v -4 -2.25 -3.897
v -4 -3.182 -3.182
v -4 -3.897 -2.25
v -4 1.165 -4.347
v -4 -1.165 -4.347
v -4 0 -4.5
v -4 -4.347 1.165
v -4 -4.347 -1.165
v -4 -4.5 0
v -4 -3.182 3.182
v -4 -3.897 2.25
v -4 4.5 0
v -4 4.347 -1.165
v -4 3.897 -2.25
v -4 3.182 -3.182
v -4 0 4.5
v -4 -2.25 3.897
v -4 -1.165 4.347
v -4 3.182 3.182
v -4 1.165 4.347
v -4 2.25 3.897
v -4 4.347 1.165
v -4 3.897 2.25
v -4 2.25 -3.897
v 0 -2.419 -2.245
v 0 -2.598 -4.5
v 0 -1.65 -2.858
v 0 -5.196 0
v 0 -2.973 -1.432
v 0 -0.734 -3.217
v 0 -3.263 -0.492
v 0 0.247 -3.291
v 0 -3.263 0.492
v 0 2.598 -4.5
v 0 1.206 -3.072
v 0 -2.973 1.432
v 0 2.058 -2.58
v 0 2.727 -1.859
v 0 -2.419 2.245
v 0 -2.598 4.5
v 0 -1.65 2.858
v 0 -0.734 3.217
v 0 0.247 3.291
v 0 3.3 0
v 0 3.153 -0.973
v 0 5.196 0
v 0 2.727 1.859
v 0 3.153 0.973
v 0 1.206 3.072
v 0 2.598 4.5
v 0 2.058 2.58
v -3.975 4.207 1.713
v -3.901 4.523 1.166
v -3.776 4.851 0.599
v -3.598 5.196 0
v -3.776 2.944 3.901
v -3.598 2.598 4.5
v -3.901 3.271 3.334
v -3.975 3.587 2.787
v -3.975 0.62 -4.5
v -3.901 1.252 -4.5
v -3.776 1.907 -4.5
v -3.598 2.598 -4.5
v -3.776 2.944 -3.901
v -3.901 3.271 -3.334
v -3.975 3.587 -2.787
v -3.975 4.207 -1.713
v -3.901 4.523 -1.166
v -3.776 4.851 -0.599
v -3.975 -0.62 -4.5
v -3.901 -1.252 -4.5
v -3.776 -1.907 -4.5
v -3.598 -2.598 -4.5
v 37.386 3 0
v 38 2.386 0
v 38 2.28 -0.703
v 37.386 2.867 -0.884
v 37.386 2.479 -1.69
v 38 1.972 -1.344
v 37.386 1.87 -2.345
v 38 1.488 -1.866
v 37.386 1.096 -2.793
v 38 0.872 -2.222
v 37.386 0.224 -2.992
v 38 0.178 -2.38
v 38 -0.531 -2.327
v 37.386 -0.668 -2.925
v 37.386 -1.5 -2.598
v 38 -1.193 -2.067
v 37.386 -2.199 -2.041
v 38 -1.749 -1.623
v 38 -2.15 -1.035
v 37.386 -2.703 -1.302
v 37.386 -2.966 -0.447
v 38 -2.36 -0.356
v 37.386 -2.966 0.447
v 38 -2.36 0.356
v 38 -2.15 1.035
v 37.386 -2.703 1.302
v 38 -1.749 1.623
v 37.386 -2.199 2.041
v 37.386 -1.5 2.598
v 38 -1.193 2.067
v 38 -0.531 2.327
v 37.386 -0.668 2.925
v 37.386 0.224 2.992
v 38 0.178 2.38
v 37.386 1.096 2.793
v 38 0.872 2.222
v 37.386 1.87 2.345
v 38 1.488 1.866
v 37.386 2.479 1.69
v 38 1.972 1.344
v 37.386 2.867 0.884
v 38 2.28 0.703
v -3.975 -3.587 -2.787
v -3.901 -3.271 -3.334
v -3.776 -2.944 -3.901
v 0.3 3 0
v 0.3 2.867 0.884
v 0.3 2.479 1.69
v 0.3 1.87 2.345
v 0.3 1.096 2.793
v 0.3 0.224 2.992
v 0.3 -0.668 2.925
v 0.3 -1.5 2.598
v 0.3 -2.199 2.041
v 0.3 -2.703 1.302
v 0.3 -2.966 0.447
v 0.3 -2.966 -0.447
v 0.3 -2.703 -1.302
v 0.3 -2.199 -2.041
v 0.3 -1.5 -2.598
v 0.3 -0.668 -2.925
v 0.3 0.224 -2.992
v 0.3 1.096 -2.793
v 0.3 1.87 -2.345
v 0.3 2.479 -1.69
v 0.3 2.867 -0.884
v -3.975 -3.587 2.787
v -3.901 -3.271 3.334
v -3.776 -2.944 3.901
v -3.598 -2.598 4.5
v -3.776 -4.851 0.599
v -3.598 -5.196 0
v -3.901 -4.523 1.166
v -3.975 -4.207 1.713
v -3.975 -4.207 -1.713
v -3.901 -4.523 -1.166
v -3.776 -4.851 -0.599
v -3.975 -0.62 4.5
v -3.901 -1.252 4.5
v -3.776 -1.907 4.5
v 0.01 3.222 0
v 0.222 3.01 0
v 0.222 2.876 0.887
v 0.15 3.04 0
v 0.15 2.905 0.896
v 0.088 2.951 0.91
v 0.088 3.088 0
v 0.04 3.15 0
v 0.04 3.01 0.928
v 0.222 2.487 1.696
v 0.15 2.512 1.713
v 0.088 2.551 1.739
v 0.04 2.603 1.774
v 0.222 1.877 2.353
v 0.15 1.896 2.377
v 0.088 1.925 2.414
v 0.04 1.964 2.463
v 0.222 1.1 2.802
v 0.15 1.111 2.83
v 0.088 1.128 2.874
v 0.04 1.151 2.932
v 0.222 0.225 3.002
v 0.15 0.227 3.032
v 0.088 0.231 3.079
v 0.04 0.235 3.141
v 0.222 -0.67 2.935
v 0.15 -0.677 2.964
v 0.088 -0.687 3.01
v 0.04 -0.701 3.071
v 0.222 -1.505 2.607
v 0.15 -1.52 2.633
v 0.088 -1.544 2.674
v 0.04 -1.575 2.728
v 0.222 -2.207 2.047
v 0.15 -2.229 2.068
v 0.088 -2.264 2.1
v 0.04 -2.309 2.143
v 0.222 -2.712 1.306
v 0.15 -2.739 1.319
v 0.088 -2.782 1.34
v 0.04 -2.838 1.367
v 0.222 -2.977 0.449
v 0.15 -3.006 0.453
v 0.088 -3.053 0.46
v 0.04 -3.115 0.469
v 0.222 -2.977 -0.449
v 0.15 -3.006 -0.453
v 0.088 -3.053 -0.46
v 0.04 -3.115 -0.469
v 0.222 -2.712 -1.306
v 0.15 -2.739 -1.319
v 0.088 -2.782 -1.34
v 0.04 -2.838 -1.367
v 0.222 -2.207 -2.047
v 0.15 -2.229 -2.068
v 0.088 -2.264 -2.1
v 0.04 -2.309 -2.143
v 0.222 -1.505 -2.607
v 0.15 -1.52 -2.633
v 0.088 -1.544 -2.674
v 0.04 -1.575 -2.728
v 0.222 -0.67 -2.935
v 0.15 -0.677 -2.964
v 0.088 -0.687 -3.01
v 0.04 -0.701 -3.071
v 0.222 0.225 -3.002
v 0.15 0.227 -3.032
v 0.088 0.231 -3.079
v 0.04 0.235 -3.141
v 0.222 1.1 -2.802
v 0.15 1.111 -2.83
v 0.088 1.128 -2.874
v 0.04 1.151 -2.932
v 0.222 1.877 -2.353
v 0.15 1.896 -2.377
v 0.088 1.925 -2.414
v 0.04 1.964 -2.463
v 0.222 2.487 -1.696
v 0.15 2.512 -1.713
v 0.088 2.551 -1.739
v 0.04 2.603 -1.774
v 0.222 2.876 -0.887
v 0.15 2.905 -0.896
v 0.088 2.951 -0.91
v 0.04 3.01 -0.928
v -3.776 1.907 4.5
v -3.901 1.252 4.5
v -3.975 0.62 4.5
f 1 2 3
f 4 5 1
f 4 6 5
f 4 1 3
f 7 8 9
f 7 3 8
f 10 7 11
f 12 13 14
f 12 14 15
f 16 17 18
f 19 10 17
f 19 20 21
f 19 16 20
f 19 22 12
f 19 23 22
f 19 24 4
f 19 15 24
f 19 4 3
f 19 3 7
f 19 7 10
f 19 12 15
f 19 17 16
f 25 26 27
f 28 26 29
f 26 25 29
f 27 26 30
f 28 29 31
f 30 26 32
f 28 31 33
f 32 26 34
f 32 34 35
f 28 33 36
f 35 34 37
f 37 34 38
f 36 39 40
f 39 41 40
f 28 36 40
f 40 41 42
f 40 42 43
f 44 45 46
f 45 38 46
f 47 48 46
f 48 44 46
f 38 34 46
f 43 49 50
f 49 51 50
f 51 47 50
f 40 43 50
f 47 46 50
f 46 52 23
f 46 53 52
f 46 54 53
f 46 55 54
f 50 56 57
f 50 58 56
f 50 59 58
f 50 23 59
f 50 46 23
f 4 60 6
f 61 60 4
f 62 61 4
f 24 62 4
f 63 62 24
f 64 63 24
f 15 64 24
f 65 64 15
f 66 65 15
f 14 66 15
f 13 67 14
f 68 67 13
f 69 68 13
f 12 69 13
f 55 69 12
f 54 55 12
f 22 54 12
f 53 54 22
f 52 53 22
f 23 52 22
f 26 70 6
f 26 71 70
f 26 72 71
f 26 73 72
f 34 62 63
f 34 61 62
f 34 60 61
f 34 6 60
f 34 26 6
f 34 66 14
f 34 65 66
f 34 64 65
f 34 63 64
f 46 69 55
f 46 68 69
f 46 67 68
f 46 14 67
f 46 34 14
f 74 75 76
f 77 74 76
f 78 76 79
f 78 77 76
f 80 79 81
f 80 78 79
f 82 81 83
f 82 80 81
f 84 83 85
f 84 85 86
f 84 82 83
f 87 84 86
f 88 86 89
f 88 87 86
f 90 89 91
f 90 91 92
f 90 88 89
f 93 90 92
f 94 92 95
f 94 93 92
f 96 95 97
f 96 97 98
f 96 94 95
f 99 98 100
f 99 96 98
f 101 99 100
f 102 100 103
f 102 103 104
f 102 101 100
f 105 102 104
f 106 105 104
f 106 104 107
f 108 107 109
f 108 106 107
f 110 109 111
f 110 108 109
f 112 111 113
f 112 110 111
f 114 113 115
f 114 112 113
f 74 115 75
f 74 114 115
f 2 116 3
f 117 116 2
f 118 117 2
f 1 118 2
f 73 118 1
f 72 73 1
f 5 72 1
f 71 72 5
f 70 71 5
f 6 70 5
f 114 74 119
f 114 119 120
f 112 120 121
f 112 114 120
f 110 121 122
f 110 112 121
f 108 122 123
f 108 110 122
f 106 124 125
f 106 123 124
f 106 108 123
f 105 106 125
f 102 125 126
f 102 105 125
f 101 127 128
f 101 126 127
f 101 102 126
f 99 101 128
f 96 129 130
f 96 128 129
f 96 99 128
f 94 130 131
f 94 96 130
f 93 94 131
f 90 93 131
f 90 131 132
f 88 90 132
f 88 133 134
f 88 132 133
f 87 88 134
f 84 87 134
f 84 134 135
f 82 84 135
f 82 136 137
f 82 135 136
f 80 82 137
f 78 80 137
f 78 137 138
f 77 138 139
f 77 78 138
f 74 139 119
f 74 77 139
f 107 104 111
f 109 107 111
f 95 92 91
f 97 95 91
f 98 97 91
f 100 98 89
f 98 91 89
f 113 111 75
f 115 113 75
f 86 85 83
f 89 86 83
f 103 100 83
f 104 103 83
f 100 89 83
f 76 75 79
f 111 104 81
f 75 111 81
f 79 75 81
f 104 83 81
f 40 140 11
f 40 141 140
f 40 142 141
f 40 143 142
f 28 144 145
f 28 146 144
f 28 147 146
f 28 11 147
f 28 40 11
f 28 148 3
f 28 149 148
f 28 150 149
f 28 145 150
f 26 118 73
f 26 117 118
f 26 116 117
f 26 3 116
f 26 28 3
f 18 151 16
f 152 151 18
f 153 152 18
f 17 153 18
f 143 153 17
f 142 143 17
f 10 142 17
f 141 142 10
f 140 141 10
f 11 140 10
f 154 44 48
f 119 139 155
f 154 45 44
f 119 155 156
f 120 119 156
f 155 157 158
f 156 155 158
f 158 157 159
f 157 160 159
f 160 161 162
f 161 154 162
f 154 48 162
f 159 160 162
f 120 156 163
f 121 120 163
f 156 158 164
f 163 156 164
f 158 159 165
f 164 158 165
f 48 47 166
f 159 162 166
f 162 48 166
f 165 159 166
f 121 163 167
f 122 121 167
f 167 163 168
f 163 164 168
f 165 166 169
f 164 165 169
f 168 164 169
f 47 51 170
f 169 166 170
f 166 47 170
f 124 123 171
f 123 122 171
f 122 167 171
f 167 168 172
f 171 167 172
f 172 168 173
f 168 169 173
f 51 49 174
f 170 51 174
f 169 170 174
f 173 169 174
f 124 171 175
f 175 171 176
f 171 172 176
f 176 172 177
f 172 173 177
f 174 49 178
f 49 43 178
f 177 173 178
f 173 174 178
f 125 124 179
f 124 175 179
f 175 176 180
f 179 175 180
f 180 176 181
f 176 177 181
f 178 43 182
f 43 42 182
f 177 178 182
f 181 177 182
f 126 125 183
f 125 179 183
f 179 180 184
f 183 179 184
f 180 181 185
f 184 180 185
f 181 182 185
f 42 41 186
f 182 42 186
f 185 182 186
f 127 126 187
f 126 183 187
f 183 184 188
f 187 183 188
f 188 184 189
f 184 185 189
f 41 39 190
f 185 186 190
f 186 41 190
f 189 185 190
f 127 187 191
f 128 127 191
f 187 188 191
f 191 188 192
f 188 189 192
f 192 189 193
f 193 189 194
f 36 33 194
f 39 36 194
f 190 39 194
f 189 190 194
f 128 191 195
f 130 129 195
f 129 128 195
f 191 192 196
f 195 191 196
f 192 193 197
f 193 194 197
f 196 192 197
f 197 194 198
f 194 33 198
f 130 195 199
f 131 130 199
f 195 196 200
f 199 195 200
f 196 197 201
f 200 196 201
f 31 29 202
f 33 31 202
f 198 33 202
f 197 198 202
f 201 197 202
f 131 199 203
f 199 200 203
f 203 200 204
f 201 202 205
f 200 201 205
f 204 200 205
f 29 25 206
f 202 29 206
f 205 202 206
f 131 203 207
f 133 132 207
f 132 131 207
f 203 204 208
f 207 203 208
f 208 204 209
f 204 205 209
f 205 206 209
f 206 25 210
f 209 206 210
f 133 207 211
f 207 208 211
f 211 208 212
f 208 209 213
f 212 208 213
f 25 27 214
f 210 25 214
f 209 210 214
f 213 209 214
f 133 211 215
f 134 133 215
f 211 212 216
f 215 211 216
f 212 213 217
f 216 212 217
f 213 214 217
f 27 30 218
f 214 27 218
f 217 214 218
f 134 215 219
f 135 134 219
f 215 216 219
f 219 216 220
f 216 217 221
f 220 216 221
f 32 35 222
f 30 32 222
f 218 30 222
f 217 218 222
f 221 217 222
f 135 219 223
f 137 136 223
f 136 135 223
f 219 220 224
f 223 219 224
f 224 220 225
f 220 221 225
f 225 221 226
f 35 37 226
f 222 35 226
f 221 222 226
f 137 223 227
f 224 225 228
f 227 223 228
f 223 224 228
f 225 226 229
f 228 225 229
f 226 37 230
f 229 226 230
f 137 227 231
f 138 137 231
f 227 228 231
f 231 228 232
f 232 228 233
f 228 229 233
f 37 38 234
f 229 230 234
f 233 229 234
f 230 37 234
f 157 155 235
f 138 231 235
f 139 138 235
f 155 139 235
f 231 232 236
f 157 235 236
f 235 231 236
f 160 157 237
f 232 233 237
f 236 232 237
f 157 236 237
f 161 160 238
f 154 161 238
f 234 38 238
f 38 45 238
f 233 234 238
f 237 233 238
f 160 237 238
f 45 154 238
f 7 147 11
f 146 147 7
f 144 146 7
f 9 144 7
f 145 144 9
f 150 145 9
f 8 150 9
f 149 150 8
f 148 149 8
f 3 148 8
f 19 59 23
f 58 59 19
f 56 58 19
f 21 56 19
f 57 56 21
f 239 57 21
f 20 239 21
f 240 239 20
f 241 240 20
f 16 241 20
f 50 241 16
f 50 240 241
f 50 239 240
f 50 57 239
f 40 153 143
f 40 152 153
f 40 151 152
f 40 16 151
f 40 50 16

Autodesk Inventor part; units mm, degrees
ref_plane "YZ Plane" through (0, 0, 0) normal (1, 0, 0) x (0, 1, 0)
ref_plane "XZ Plane" through (0, 0, 0) normal (0, 1, 0) x (-1, 0, 0)
sketch "Sketch1" plane through (0, 0, 0) normal (0, 0, 1) x (1, 0, 0)
  line L0 (0, 3) -> (38, 3)
  line L1 (38, 3) -> (38, 0)
  line L2 (38, 0) -> (0, 0)
  line L3 (-7.6, 0) -> (45.6, 0) projected
  line L4 (0, -0.6) -> (0, 3.6) projected
  line L5 (0, 3) -> (0, 0)
  dimension "d2" = 6
  dimension "d59" = 38
revolve "Body" add sketch "Sketch1" angle 360 about axis through (38, 0, 0) along (-1, 0, 0)
sketch "Sketch2" plane through (0, 0, 0) normal (-1, 0, 0) x (0, 0, 1)
  line L0 (0, 5.1962) -> (4.5, 2.5981)
  line L1 (4.5, 2.5981) -> (4.5, -2.5981)
  line L2 (4.5, -2.5981) -> (0, -5.1962)
  line L3 (0, -5.1962) -> (-4.5, -2.5981)
  line L4 (-4.5, -2.5981) -> (-4.5, 2.5981)
  line L5 (-4.5, 2.5981) -> (0, 5.1962)
  line L6 (-6.3, 0) -> (6.3, 0) projected
  line L7 (0, 7.2746) -> (0, -7.2746) projected
  point P0 (0, 0)
  point P1 (0, 0)
  dimension "d11" = 9
extrude "Head" add sketch "Sketch2" along normal blind 4
sketch "Sketch4" plane through (0, 0, 0) normal (0, 0, 1) x (1, 0, 0)
  line L0 (-3.4804, 5.4) -> (-4, 4.5)
  line L1 (-1.1, 0) -> (-0.234, 0)
  line L2 (-4.7532, 0) -> (0.5192, 0) projected
  line L3 (-4, 5.4) -> (-3.4804, 5.4)
  line L4 (-4, 4.5) -> (-4, 5.4)
  line L5 (0, 6.48) -> (0, -1.08) projected
  dimension "d65" = 9
  dimension "d67" = 30
  dimension "d68" = 10.8
  dimension "d69" = 4
revolve "Chamfer1" cut sketch "Sketch4" angle 360 about axis through (-1.1, 0, 0) along (1, 0, 0)
thread "Thread" size "M6x1" class "6g" standard "ISO Metric profile" length 11
chamfer "Chamfer2" distance 0.6135 distance2 0.6136 1 edges at (38, -3, 0) measured on face at (38, 0.7485, -0.9828)
fillet "Fillet2" radius 0.3 1 edges at (0, -3, 0)
ref_plane "Work Plane1" through (1.525, 0, 0) normal (0, 0, 1) x (1, 0, 0)
equation "\"d71\" = RR"
equation "\"d11\" = SW"
equation "\"d3\" = KOH"
equation "\"d15\" = GEL"
equation "\"d6\" = -0.5 * SPD + 0.5 * GD"
equation "\"d2\" = GD"
equation "\"d59\" = NLG"
equation "\"d65\" = SW"
equation "\"d67\" = ANG1"
equation "\"d68\" = 1.2 * SW"
equation "\"d69\" = KOH"
equation "\"NLG\" = 38"
equation "\"GD\" = NND"
equation "\"BDM\" = NND"
equation "\"KOH\" = 4"
equation "\"GEL\" = 11"
equation "\"SW\" = 9"
equation "\"SW0\" = SW"
equation "\"SPD\" = NND - 1.2269 * PTC"
equation "\"SD2\" = NND"
equation "\"SD\" = 0"
equation "\"ANG1\" = 30deg"
equation "\"GAL\" = 0.61345 * PTC"
equation "\"GUL\" = 0.61345 * PTC"
equation "\"RR\" = 0.3"
equation "\"RR1\" = 0.1"
equation "\"GD1\" = THREADDIA - 1.2269 * PTC"
equation "\"THREADDIA\" = 6"
equation "\"TOA\" = 30deg"
equation "\"FAWI\" = 60deg"
equation "\"PTC\" = 1"
equation "\"NND\" = 6"
equation "\"E0\" = 1.155 * SW"
properties part number "STN 02 1201 - M6 x 38" material "Steel, Mild"
